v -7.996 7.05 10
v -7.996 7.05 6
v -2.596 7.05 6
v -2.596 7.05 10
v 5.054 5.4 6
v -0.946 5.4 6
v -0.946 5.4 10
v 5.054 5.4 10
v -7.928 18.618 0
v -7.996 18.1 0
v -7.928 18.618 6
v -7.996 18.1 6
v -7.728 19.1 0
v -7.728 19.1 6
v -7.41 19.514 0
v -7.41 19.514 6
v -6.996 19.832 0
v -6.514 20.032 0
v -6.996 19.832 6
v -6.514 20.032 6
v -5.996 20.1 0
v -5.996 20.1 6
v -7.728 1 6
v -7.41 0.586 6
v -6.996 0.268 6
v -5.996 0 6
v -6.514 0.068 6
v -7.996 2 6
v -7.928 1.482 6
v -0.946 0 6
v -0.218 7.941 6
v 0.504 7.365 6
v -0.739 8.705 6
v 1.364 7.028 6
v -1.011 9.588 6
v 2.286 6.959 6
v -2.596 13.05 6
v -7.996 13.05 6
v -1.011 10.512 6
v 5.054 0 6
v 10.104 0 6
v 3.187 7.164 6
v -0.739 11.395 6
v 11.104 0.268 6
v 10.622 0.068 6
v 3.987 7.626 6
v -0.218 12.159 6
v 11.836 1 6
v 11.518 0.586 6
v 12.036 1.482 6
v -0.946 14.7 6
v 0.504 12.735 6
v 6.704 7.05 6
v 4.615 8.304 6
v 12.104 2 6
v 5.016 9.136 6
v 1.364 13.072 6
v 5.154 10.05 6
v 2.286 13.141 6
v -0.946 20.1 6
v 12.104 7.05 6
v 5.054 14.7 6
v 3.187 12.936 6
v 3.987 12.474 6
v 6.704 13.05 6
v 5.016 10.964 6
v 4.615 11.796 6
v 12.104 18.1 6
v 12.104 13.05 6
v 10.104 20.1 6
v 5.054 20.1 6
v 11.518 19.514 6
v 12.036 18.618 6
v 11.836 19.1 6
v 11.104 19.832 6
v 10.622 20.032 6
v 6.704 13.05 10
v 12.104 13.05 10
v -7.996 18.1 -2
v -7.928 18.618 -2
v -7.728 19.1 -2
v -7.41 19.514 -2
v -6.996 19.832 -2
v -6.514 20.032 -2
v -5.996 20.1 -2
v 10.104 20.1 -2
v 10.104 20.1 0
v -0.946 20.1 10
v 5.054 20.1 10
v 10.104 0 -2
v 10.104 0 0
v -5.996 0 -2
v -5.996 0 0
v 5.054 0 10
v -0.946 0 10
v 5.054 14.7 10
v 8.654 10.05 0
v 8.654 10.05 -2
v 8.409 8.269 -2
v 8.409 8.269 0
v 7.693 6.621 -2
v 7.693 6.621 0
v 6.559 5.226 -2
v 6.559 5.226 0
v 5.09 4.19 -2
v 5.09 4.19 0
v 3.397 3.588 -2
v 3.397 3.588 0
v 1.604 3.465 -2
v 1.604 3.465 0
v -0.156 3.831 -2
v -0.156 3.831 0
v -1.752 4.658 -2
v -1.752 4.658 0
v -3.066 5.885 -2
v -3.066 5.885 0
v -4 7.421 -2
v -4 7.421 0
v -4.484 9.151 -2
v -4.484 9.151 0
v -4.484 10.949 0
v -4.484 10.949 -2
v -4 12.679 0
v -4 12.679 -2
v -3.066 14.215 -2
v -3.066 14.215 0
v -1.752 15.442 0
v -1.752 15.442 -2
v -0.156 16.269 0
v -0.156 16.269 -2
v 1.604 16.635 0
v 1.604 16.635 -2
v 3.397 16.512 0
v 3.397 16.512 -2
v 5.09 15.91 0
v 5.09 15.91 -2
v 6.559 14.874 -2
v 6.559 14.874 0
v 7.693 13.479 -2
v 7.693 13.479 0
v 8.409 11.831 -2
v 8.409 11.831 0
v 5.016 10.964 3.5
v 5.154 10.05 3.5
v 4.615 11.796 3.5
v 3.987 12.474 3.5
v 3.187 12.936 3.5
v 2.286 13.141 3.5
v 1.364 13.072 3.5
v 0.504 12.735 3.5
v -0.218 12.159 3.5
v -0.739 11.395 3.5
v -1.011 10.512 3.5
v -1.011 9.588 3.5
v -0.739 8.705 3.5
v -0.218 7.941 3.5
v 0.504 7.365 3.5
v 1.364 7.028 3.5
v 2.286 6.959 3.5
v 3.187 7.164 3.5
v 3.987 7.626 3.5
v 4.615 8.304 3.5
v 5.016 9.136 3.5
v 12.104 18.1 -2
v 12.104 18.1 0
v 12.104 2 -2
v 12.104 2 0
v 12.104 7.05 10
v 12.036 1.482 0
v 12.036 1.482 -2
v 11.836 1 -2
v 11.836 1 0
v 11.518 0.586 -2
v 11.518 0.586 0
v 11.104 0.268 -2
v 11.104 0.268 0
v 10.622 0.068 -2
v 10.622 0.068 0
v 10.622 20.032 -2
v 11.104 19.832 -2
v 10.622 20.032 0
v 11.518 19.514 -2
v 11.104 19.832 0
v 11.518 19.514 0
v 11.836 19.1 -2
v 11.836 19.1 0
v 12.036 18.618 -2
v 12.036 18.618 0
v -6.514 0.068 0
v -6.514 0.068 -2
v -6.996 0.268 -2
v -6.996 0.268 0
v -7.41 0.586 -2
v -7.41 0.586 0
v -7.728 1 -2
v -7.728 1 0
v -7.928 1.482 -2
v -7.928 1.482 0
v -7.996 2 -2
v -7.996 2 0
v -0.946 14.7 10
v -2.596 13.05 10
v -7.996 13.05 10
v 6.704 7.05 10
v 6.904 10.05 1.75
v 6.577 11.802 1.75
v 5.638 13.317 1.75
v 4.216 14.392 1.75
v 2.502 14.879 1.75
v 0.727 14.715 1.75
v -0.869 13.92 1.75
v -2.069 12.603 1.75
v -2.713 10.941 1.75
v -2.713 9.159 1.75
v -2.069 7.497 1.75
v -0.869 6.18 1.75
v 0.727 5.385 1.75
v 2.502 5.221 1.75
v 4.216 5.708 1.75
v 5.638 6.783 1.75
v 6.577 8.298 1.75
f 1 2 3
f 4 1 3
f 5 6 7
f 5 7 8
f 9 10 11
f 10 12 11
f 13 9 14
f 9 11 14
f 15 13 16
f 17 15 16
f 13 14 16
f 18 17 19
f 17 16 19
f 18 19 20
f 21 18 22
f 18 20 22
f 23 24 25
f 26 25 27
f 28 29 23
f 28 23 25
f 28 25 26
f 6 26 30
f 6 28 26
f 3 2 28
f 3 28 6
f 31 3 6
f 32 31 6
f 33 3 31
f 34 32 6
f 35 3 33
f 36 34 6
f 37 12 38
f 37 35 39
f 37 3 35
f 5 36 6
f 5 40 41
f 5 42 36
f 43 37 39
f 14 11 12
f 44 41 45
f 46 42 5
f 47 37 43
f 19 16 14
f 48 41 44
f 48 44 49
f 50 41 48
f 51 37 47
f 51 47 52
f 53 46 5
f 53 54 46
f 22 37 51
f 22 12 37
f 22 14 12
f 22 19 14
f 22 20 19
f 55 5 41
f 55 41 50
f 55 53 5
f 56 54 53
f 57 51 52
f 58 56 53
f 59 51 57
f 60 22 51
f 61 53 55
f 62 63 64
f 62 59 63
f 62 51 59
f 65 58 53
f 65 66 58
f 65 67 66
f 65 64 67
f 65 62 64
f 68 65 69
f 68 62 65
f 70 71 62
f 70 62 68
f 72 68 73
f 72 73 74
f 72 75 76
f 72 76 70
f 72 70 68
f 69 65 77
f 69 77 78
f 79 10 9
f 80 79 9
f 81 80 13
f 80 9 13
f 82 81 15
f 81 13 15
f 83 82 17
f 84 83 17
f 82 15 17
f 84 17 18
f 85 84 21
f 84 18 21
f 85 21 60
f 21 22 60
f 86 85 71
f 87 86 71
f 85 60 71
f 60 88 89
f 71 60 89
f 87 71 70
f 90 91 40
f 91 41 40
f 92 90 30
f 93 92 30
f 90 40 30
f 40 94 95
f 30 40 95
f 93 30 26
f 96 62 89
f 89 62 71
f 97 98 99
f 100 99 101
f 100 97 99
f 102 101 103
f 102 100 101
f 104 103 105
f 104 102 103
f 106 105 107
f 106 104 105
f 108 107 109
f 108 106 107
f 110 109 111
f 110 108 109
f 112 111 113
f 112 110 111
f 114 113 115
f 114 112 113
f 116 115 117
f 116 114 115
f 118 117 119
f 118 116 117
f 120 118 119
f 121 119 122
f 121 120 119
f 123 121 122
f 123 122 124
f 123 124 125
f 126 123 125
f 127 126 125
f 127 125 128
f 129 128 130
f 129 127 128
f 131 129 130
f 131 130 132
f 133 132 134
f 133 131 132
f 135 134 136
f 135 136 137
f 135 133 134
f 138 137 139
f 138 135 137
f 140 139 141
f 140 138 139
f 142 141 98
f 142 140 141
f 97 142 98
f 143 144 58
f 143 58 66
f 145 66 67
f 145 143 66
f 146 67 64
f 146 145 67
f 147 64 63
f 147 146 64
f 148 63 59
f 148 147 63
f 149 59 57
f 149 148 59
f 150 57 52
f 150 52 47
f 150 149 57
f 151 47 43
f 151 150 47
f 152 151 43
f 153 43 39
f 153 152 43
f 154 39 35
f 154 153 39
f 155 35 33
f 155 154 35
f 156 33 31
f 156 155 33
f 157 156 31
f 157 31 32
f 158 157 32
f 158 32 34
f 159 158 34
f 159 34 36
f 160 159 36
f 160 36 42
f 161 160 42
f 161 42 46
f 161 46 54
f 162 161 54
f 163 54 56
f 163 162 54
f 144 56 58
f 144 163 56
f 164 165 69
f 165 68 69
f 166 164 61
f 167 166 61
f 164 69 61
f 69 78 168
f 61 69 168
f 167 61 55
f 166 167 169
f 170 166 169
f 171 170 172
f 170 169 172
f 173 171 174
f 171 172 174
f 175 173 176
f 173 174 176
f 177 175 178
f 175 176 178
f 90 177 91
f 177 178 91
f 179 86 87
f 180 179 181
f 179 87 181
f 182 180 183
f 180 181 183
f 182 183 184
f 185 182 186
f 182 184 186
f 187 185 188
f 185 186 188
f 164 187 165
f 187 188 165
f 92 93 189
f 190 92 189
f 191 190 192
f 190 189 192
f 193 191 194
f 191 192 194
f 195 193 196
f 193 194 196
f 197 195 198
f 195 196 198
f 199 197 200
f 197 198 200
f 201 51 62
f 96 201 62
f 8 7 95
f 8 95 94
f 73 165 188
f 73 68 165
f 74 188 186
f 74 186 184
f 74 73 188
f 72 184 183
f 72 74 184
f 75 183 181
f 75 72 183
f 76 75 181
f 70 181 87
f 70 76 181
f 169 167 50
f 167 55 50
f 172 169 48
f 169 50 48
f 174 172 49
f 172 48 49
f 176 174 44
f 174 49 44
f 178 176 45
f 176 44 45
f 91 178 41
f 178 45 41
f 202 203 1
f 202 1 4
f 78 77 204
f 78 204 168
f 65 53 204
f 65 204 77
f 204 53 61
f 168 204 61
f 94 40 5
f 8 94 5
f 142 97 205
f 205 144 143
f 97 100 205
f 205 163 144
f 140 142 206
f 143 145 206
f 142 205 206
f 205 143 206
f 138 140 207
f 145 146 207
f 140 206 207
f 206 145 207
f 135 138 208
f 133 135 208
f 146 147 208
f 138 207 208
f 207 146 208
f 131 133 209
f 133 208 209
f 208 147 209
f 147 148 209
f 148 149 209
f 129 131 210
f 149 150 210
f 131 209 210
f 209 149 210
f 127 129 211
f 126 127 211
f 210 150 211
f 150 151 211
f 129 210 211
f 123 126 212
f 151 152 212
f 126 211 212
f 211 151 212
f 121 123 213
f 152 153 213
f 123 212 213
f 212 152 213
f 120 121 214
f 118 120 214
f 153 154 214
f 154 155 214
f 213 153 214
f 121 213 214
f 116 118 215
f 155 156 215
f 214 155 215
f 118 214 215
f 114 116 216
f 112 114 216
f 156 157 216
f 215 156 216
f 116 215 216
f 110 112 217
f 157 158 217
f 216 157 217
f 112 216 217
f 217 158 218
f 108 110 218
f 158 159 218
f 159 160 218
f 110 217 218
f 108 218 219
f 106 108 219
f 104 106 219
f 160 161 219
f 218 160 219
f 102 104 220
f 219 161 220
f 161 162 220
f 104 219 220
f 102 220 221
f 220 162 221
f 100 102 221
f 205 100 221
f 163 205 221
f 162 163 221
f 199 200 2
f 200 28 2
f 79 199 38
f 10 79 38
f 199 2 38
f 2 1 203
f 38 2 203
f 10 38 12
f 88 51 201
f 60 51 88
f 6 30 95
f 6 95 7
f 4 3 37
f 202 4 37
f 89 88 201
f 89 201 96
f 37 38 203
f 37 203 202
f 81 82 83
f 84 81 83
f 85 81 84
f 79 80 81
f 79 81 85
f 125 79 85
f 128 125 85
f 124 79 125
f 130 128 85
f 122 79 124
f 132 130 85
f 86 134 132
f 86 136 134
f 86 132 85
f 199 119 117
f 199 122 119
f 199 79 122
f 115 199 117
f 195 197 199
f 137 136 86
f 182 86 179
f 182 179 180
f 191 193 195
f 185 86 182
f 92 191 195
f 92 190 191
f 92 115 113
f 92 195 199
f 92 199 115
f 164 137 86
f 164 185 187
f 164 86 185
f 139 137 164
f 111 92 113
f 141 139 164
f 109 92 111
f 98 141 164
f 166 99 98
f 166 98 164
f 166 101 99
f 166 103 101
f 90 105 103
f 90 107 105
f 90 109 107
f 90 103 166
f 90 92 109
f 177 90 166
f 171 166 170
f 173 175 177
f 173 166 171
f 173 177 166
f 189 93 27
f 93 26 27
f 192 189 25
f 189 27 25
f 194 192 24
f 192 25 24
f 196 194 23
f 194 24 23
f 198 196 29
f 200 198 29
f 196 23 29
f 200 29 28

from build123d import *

# Parameters (mm, degrees)
F0_R      = 3.1
F0_W      = 5.4
F0_H      = 6
F0_W_2    = 6
F0_H_2    = 5.4
F1_DEPTH  = 6
F2_DEPTH  = 10
F3_R      = 2
F4_SIZE   = 3.5
F1_FACE_R = 6.6
F5_DEPTH  = 2


with BuildPart() as f1:
    # F0 (on Top) → F1 (new body)
    with BuildSketch(Plane.XY):
        Polygon((-7.995946, 7.05), (-7.995946, 0), (-0.945946, 0), (-0.945946, 5.4), (5.054054, 5.4), (5.054054, 0), (12.104054, 0), (12.104054, 7.05), (6.704054, 7.05), (6.704054, 13.05), (12.104054, 13.05), (12.104054, 20.1), (5.054054, 20.1), (5.054054, 14.7), (-0.945946, 14.7), (-0.945946, 20.1), (-7.995946, 20.1), (-7.995946, 13.05), (-2.595946, 13.05), (-2.595946, 7.05), align=None)
        with Locations((2.054054, 10.05)):
            Circle(F0_R, mode=Mode.SUBTRACT)
        with Locations((9.404054, 10.05)):
            Rectangle(F0_W, F0_H)
        with Locations((-5.295946, 10.05)):
            Rectangle(F0_W, F0_H)
        with Locations((2.054054, 17.4)):
            Rectangle(F0_W_2, F0_H_2)
        with Locations((2.054054, 2.7)):
            Rectangle(F0_W_2, F0_H_2)
    extrude(amount=F1_DEPTH)

    # F0 (on Top) → F2 (join)
    with BuildSketch(Plane.XY):
        with Locations((2.054054, 17.4)):
            Rectangle(F0_W_2, F0_H_2)
        with Locations((-5.295946, 10.05)):
            Rectangle(F0_W, F0_H)
        with Locations((2.054054, 2.7)):
            Rectangle(F0_W_2, F0_H_2)
        with Locations((9.404054, 10.05)):
            Rectangle(F0_W, F0_H)
    extrude(amount=F2_DEPTH)

    # F3
    f3_edges = [f1.edges().sort_by_distance(p)[0] for p in [
        (-7.995946, 0, 3),
        (12.104054, 0, 3),
        (12.104054, 20.1, 3),
        (-7.995946, 20.1, 3),
    ]]
    fillet(f3_edges, radius=F3_R)

    # F4
    f4_edges = [f1.edges().sort_by_distance(p)[0] for p in [
        (-1.045946, 10.05, 0),
    ]]
    chamfer(f4_edges, length=F4_SIZE)

    # F1_face (on face) → F5 (join)
    with BuildSketch(Plane(origin=(2.054054, 10.05, 0), x_dir=(1, 0, 0), z_dir=(0, 0, -1))):
        with BuildLine():
            Line((-8.05, -10.05), (8.05, -10.05))
            ThreePointArc((8.05, -10.05), (9.464214, -9.464214), (10.05, -8.05))
            Line((10.05, -8.05), (10.05, 8.05))
            ThreePointArc((10.05, 8.05), (9.464214, 9.464214), (8.05, 10.05))
            Line((8.05, 10.05), (-8.05, 10.05))
            ThreePointArc((-8.05, 10.05), (-9.464214, 9.464214), (-10.05, 8.05))
            Line((-10.05, 8.05), (-10.05, -8.05))
            ThreePointArc((-10.05, -8.05), (-9.464214, -9.464214), (-8.05, -10.05))
        make_face()
        Circle(F1_FACE_R, mode=Mode.SUBTRACT)
    extrude(amount=F5_DEPTH)


solid = f1.part
